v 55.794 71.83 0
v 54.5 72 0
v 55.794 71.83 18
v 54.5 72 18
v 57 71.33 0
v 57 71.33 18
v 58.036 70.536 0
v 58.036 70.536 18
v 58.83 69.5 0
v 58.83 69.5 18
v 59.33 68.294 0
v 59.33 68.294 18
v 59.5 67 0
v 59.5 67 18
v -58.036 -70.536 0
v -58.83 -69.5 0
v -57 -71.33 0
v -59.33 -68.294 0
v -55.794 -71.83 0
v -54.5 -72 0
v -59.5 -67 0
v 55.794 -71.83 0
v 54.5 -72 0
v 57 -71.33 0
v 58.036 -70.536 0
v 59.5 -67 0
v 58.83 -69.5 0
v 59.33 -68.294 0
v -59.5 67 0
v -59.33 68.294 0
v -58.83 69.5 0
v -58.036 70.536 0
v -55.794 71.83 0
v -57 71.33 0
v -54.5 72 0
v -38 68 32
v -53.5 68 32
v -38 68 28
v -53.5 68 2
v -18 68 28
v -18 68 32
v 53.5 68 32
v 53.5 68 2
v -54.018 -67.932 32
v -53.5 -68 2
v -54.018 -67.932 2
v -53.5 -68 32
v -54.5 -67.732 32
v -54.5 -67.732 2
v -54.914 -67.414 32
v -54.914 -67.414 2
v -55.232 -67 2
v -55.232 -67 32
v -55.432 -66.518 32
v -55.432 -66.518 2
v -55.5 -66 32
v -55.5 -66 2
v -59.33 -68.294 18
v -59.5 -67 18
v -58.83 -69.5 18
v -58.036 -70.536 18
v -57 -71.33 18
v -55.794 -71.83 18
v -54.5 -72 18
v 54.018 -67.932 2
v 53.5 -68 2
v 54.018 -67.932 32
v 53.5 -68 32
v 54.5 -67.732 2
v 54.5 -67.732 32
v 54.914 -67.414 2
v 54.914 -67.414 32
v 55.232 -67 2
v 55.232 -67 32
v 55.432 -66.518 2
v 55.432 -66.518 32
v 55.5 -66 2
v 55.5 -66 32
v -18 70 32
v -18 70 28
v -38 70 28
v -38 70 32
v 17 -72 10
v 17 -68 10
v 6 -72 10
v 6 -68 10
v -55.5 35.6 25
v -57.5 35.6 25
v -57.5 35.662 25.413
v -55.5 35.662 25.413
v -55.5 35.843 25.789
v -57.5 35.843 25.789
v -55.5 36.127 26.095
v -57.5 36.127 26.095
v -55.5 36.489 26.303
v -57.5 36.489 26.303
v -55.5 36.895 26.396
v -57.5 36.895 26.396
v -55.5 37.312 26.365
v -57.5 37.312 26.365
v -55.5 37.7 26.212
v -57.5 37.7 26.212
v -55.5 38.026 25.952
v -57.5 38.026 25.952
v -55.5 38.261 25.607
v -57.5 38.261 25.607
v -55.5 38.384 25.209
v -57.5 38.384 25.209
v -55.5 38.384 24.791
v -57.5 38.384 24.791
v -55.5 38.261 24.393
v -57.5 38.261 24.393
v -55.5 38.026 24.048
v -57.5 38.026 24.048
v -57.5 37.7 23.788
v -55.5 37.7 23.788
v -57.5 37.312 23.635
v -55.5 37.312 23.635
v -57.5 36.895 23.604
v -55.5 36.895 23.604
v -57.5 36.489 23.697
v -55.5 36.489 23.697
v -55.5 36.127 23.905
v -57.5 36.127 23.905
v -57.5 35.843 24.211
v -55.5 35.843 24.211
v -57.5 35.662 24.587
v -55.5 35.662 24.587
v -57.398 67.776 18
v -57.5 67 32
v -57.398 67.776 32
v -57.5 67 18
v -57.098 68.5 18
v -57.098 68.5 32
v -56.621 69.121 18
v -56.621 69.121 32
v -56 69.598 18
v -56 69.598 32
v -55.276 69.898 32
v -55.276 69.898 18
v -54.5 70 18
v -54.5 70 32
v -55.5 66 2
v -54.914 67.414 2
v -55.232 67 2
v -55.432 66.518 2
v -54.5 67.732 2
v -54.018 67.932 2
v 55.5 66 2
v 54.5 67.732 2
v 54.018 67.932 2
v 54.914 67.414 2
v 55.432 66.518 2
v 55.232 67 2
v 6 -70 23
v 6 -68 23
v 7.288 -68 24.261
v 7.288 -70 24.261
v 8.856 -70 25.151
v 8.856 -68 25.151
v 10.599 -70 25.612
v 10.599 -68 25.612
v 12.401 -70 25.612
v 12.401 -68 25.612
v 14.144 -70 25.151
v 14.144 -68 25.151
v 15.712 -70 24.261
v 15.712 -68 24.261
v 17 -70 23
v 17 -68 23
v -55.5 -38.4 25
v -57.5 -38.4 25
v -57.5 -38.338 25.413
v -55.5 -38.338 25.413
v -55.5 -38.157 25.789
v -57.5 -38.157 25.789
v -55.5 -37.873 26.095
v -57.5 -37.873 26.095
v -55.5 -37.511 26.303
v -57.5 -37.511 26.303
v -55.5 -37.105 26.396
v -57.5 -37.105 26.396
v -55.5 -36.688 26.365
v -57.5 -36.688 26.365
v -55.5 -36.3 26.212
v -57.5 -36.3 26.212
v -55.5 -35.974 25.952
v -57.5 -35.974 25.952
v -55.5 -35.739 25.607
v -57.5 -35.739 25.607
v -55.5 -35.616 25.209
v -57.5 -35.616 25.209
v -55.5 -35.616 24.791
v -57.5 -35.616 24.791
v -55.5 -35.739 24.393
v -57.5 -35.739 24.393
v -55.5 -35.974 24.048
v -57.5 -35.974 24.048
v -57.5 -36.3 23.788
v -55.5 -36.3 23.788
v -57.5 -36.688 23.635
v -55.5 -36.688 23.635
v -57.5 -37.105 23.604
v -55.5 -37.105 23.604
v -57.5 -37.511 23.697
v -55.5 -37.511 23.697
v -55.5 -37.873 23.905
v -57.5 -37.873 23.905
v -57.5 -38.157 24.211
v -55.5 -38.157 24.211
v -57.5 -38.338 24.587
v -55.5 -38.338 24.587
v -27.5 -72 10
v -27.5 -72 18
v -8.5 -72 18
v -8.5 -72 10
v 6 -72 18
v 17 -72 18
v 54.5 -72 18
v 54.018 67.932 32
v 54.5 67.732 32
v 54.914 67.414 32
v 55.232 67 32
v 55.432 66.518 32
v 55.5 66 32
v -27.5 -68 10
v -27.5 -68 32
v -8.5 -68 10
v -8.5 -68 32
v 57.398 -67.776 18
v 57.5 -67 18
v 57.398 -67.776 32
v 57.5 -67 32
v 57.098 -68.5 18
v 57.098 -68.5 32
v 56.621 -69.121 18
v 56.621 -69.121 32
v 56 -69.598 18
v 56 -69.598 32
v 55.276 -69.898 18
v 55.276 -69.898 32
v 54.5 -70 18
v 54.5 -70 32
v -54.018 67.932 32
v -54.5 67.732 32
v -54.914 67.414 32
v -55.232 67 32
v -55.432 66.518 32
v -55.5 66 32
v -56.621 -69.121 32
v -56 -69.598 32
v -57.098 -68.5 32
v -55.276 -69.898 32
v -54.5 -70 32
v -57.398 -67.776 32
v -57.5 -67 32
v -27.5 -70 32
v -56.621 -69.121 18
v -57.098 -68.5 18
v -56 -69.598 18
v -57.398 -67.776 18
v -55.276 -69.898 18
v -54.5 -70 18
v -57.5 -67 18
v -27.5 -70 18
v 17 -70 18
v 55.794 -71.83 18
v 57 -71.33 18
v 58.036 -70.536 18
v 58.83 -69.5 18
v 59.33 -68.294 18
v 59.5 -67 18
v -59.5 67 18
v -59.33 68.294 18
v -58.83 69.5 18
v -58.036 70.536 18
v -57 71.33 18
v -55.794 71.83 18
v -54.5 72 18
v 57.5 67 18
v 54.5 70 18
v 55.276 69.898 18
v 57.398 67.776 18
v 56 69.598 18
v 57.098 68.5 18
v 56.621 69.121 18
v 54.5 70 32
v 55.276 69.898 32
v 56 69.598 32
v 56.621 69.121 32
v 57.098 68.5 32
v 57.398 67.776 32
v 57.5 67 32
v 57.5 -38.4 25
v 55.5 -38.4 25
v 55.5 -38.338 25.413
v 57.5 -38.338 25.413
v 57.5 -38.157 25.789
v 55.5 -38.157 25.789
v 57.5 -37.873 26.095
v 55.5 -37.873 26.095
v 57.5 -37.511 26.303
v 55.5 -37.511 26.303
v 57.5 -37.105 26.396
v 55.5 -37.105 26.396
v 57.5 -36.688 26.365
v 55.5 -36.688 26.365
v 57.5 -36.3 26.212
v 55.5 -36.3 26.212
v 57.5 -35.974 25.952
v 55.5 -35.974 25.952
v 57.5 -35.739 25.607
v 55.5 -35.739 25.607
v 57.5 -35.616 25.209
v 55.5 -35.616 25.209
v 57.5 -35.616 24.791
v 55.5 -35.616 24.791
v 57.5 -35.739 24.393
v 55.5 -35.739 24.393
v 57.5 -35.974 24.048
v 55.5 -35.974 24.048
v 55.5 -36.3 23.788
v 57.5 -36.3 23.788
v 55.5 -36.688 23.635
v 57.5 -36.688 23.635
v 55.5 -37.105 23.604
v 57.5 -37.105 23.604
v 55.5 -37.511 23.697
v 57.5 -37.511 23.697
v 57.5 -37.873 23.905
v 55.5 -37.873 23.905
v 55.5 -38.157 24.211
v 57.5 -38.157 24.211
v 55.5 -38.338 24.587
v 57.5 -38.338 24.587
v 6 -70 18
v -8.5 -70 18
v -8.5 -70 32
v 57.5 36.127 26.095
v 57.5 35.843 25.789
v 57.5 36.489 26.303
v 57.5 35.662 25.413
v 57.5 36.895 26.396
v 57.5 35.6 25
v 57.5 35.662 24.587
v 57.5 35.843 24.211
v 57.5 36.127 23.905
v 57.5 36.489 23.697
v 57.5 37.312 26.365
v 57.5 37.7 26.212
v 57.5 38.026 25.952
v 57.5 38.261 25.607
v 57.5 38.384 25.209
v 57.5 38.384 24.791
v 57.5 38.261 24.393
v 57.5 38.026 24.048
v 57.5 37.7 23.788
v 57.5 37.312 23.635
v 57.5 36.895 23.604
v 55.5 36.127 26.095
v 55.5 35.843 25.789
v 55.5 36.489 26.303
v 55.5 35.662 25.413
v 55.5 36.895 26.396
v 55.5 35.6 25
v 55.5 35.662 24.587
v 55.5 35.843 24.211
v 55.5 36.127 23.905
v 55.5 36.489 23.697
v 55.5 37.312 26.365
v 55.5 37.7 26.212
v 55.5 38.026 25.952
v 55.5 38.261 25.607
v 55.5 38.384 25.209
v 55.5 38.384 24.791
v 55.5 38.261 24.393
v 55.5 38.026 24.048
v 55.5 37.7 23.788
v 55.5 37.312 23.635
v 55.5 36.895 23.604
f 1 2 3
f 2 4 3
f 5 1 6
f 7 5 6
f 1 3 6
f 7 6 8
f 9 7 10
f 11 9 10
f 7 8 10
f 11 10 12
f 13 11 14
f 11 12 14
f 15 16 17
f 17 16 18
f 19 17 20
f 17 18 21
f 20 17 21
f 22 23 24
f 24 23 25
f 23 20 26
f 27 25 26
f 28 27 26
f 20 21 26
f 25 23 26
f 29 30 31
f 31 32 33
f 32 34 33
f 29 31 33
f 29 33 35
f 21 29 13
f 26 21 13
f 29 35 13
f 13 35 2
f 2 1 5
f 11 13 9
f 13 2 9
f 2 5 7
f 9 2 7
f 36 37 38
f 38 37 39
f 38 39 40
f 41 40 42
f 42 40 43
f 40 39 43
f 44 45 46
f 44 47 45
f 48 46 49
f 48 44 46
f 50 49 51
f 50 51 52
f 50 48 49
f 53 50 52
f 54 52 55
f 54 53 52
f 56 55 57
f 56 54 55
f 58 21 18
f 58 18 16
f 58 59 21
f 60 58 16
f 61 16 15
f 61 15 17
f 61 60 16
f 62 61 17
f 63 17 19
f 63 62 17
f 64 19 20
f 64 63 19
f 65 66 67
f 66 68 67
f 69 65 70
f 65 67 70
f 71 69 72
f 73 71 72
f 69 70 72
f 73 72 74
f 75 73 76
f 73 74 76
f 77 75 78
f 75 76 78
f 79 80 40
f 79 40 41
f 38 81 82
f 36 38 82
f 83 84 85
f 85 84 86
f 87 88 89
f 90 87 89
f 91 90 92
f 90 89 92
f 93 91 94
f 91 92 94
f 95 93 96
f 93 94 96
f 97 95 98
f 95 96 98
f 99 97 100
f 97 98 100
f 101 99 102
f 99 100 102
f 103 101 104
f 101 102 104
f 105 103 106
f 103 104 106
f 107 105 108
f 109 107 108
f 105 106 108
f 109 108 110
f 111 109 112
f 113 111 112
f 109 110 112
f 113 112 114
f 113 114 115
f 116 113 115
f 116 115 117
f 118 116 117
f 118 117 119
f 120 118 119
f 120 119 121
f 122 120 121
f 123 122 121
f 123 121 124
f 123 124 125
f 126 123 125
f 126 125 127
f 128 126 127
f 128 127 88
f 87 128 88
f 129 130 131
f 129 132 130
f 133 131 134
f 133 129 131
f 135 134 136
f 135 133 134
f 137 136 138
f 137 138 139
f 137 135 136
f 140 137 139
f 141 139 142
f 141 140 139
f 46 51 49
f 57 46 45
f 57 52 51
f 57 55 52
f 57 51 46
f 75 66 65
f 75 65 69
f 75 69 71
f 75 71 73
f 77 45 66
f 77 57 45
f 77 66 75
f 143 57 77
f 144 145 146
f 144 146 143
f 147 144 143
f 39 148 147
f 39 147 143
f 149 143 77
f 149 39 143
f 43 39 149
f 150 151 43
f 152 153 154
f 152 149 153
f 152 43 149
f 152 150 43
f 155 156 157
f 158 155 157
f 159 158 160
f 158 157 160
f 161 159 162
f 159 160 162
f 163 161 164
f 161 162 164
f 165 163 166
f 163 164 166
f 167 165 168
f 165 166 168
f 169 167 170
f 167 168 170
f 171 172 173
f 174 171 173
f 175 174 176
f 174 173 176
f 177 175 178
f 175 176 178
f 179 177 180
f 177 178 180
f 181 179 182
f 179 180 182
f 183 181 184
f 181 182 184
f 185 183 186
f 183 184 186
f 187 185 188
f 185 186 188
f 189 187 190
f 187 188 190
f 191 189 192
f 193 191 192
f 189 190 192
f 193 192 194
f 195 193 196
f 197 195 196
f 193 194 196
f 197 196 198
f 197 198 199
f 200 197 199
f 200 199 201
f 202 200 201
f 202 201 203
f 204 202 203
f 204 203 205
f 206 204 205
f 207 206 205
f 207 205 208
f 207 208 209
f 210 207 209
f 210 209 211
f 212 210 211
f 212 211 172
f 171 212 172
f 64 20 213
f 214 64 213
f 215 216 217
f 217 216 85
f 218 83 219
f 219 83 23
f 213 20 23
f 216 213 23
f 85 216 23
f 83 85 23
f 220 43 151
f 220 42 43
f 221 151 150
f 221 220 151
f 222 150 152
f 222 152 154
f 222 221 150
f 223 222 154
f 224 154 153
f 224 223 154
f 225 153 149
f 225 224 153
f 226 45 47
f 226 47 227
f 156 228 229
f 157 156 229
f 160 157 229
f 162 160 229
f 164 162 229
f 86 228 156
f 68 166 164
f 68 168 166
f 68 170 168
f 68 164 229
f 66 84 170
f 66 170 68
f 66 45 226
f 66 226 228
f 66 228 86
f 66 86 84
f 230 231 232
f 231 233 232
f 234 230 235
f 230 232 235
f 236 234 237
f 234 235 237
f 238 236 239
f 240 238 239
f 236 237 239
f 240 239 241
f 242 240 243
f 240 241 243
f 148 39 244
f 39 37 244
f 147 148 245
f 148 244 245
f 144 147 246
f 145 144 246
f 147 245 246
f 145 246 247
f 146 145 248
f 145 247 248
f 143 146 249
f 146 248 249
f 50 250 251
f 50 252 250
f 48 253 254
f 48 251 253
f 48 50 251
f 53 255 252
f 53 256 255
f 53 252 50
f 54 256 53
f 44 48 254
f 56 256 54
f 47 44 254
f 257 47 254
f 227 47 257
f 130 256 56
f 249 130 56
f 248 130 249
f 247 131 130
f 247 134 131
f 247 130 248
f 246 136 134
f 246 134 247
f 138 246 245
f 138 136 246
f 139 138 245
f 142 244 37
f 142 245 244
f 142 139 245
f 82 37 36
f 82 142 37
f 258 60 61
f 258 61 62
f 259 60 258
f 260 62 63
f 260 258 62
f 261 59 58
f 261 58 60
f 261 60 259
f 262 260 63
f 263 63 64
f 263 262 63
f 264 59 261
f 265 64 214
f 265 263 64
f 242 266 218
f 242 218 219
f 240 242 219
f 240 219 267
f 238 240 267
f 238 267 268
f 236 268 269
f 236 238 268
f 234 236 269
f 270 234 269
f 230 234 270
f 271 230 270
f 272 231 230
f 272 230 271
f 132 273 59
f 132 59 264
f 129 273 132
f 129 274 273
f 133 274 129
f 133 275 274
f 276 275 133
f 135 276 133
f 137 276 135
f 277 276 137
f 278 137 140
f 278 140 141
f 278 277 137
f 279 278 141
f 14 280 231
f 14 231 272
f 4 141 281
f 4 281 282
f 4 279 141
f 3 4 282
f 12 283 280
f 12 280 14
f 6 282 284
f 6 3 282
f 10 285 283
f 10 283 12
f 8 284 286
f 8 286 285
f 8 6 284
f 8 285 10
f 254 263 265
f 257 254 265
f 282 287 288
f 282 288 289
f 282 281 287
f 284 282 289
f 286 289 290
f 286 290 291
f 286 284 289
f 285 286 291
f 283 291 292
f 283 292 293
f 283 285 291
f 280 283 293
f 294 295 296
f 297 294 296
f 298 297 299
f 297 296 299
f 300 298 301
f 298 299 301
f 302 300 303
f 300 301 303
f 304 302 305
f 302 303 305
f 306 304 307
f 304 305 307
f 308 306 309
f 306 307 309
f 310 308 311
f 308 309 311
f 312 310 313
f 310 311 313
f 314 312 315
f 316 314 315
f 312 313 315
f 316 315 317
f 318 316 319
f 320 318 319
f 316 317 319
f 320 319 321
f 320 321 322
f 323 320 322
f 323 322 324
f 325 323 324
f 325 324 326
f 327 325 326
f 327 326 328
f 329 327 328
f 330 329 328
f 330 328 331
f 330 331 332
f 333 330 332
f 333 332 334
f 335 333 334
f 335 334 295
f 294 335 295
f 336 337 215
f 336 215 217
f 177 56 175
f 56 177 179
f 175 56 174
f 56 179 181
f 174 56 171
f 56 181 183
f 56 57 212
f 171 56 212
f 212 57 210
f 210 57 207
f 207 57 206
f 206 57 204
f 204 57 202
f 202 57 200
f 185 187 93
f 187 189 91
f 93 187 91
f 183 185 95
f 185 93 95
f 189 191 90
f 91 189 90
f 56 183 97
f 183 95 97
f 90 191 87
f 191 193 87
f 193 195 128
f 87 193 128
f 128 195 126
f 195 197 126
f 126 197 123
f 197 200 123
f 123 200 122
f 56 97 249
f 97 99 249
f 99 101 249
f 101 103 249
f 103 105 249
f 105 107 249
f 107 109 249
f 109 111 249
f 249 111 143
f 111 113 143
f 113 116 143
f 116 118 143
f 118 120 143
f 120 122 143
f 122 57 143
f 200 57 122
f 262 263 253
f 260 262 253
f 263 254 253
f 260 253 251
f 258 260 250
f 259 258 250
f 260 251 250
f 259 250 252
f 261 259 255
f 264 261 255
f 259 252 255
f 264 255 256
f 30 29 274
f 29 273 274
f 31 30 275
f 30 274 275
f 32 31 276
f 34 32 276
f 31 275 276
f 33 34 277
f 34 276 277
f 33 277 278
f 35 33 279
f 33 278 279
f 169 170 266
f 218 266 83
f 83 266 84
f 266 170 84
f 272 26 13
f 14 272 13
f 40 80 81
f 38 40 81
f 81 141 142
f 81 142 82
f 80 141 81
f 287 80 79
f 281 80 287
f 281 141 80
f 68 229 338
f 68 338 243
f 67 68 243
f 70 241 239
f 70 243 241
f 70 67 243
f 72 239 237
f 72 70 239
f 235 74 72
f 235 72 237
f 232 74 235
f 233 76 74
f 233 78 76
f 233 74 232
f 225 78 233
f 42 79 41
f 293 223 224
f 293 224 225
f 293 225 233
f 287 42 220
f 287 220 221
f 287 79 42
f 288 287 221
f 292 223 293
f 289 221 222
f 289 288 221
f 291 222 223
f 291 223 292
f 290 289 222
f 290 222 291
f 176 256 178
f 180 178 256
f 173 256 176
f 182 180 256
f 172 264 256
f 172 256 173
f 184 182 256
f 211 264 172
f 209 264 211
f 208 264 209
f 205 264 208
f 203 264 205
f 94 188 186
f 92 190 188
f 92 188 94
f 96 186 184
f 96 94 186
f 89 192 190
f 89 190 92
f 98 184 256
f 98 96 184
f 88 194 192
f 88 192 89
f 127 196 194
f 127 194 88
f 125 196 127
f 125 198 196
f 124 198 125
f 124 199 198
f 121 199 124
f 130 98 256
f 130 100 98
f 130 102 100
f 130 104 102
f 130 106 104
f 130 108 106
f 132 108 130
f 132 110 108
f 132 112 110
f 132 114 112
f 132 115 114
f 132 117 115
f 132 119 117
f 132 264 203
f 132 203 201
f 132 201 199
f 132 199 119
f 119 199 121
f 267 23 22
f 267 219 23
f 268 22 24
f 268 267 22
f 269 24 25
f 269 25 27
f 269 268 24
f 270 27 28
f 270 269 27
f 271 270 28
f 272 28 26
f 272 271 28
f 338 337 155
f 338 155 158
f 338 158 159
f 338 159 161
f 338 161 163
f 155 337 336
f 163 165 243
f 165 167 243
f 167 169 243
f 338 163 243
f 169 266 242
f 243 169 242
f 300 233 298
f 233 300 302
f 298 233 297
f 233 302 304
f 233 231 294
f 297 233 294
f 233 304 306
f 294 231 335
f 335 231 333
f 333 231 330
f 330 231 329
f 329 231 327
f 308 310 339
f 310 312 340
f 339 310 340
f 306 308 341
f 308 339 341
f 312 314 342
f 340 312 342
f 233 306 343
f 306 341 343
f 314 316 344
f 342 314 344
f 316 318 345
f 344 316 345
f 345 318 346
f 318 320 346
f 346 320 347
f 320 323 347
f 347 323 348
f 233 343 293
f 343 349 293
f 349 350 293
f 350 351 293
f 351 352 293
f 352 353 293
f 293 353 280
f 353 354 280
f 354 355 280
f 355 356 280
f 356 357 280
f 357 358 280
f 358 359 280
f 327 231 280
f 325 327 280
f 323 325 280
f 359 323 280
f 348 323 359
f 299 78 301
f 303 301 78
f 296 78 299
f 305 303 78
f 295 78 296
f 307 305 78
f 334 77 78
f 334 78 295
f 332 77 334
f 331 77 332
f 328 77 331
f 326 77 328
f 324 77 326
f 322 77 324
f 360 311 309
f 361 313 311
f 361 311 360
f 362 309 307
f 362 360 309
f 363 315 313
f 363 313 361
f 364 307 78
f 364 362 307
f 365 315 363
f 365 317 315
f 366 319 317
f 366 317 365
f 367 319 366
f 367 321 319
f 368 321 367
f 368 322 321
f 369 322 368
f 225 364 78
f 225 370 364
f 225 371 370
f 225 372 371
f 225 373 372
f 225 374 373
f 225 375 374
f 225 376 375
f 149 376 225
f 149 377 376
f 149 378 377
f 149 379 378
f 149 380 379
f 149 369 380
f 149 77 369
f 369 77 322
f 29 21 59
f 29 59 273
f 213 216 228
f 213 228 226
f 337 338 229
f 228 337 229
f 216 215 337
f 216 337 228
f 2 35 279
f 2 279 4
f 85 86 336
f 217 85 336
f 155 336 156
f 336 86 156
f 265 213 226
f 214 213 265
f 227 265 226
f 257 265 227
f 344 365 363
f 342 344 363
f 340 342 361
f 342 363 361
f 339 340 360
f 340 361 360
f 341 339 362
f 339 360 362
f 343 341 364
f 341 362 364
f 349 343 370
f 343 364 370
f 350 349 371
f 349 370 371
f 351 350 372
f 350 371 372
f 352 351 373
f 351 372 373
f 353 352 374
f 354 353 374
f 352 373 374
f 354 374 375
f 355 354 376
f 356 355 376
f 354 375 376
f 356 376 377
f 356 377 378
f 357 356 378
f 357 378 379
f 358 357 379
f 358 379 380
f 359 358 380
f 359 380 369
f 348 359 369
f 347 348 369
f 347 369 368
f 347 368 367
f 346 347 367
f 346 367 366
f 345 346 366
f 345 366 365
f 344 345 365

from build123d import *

# Parameters (mm, degrees)
F0_W      = 115
F0_H      = 140
F1_DEPTH  = 2
F2_W      = 115
F2_H      = 140
F2_W_2    = 111
F2_H_2    = 136
F3_DEPTH  = 30
F4_W      = 119
F4_H      = 144
F4_W_2    = 115
F4_H_2    = 140
F5_DEPTH  = 18
F6_W      = 19
F6_H      = 3.2217571437
F6_H_2    = 32
F7_DEPTH  = 5
F8_W      = 20
F8_H      = 11
F9_DEPTH  = 2
F10_R     = 5
F11_R     = 3
F12_R     = 2
F13_R     = 1.4
F14_DEPTH = 117.001


with BuildPart() as f1:
    # F0 (on Top) → F1 (new body)
    with BuildSketch(Plane.XY):
        Rectangle(F0_W, F0_H)
    extrude(amount=F1_DEPTH)

    # F2 (on face) → F3 (join)
    with BuildSketch(Plane.XY.offset(2)):
        Rectangle(F2_W, F2_H)
        Rectangle(F2_W_2, F2_H_2, mode=Mode.SUBTRACT)
    extrude(amount=F3_DEPTH)

    # F4 (on Top) → F5 (join)
    with BuildSketch(Plane.XY):
        Rectangle(F4_W, F4_H)
        Rectangle(F4_W_2, F4_H_2, mode=Mode.SUBTRACT)
    extrude(amount=F5_DEPTH)

    # F6 (on face) → F7 (cut, symmetric)
    with BuildSketch(Plane(origin=(0, -68, 0), x_dir=(-1, 0, 0), z_dir=(0, 1, 0))):
        with Locations((18, 43.6108785719)):
            Rectangle(F6_W, F6_H)
        with Locations((18, 26)):
            Rectangle(F6_W, F6_H_2)
        with BuildLine():
            Line((-17, 10), (-6, 10))
            Line((-6, 10), (-6, 23))
            ThreePointArc((-6, 23), (-11.5, 25.6698729811), (-17, 23))
            Line((-17, 23), (-17, 10))
        make_face()
    extrude(amount=F7_DEPTH, both=True, mode=Mode.SUBTRACT)

    # F8 (on face) → F9 (cut)
    with BuildSketch(Plane(origin=(0, 70, 0), x_dir=(-1, 0, 0), z_dir=(0, 1, 0))):
        with Locations((28, 33.5)):
            Rectangle(F8_W, F8_H)
    extrude(amount=-F9_DEPTH, mode=Mode.SUBTRACT)

    # F10
    f10_edges = [f1.edges().sort_by_distance(p)[0] for p in [
        (-59.5, -72, 9),
        (59.5, -72, 9),
        (-59.5, 72, 9),
        (59.5, 72, 9),
    ]]
    fillet(f10_edges, radius=F10_R)

    # F11
    f11_edges = [f1.edges().sort_by_distance(p)[0] for p in [
        (-57.5, -70, 25),
        (57.5, -70, 25),
        (57.5, 70, 25),
        (-57.5, 70, 25),
    ]]
    fillet(f11_edges, radius=F11_R)

    # F12
    f12_edges = [f1.edges().sort_by_distance(p)[0] for p in [
        (-55.5, -68, 17),
        (55.5, -68, 17),
        (55.5, 68, 17),
        (-55.5, 68, 17),
    ]]
    fillet(f12_edges, radius=F12_R)

    # F13 (on face) → F14 (cut, through all)
    with BuildSketch(Plane(origin=(-57.5, 0, 0), x_dir=(0, -1, 0), z_dir=(-1, 0, 0))):
        with Locations((-37, 25)):
            Circle(F13_R)
        with Locations((37, 25)):
            Circle(F13_R)
    extrude(amount=-F14_DEPTH, mode=Mode.SUBTRACT)


solid = f1.part
